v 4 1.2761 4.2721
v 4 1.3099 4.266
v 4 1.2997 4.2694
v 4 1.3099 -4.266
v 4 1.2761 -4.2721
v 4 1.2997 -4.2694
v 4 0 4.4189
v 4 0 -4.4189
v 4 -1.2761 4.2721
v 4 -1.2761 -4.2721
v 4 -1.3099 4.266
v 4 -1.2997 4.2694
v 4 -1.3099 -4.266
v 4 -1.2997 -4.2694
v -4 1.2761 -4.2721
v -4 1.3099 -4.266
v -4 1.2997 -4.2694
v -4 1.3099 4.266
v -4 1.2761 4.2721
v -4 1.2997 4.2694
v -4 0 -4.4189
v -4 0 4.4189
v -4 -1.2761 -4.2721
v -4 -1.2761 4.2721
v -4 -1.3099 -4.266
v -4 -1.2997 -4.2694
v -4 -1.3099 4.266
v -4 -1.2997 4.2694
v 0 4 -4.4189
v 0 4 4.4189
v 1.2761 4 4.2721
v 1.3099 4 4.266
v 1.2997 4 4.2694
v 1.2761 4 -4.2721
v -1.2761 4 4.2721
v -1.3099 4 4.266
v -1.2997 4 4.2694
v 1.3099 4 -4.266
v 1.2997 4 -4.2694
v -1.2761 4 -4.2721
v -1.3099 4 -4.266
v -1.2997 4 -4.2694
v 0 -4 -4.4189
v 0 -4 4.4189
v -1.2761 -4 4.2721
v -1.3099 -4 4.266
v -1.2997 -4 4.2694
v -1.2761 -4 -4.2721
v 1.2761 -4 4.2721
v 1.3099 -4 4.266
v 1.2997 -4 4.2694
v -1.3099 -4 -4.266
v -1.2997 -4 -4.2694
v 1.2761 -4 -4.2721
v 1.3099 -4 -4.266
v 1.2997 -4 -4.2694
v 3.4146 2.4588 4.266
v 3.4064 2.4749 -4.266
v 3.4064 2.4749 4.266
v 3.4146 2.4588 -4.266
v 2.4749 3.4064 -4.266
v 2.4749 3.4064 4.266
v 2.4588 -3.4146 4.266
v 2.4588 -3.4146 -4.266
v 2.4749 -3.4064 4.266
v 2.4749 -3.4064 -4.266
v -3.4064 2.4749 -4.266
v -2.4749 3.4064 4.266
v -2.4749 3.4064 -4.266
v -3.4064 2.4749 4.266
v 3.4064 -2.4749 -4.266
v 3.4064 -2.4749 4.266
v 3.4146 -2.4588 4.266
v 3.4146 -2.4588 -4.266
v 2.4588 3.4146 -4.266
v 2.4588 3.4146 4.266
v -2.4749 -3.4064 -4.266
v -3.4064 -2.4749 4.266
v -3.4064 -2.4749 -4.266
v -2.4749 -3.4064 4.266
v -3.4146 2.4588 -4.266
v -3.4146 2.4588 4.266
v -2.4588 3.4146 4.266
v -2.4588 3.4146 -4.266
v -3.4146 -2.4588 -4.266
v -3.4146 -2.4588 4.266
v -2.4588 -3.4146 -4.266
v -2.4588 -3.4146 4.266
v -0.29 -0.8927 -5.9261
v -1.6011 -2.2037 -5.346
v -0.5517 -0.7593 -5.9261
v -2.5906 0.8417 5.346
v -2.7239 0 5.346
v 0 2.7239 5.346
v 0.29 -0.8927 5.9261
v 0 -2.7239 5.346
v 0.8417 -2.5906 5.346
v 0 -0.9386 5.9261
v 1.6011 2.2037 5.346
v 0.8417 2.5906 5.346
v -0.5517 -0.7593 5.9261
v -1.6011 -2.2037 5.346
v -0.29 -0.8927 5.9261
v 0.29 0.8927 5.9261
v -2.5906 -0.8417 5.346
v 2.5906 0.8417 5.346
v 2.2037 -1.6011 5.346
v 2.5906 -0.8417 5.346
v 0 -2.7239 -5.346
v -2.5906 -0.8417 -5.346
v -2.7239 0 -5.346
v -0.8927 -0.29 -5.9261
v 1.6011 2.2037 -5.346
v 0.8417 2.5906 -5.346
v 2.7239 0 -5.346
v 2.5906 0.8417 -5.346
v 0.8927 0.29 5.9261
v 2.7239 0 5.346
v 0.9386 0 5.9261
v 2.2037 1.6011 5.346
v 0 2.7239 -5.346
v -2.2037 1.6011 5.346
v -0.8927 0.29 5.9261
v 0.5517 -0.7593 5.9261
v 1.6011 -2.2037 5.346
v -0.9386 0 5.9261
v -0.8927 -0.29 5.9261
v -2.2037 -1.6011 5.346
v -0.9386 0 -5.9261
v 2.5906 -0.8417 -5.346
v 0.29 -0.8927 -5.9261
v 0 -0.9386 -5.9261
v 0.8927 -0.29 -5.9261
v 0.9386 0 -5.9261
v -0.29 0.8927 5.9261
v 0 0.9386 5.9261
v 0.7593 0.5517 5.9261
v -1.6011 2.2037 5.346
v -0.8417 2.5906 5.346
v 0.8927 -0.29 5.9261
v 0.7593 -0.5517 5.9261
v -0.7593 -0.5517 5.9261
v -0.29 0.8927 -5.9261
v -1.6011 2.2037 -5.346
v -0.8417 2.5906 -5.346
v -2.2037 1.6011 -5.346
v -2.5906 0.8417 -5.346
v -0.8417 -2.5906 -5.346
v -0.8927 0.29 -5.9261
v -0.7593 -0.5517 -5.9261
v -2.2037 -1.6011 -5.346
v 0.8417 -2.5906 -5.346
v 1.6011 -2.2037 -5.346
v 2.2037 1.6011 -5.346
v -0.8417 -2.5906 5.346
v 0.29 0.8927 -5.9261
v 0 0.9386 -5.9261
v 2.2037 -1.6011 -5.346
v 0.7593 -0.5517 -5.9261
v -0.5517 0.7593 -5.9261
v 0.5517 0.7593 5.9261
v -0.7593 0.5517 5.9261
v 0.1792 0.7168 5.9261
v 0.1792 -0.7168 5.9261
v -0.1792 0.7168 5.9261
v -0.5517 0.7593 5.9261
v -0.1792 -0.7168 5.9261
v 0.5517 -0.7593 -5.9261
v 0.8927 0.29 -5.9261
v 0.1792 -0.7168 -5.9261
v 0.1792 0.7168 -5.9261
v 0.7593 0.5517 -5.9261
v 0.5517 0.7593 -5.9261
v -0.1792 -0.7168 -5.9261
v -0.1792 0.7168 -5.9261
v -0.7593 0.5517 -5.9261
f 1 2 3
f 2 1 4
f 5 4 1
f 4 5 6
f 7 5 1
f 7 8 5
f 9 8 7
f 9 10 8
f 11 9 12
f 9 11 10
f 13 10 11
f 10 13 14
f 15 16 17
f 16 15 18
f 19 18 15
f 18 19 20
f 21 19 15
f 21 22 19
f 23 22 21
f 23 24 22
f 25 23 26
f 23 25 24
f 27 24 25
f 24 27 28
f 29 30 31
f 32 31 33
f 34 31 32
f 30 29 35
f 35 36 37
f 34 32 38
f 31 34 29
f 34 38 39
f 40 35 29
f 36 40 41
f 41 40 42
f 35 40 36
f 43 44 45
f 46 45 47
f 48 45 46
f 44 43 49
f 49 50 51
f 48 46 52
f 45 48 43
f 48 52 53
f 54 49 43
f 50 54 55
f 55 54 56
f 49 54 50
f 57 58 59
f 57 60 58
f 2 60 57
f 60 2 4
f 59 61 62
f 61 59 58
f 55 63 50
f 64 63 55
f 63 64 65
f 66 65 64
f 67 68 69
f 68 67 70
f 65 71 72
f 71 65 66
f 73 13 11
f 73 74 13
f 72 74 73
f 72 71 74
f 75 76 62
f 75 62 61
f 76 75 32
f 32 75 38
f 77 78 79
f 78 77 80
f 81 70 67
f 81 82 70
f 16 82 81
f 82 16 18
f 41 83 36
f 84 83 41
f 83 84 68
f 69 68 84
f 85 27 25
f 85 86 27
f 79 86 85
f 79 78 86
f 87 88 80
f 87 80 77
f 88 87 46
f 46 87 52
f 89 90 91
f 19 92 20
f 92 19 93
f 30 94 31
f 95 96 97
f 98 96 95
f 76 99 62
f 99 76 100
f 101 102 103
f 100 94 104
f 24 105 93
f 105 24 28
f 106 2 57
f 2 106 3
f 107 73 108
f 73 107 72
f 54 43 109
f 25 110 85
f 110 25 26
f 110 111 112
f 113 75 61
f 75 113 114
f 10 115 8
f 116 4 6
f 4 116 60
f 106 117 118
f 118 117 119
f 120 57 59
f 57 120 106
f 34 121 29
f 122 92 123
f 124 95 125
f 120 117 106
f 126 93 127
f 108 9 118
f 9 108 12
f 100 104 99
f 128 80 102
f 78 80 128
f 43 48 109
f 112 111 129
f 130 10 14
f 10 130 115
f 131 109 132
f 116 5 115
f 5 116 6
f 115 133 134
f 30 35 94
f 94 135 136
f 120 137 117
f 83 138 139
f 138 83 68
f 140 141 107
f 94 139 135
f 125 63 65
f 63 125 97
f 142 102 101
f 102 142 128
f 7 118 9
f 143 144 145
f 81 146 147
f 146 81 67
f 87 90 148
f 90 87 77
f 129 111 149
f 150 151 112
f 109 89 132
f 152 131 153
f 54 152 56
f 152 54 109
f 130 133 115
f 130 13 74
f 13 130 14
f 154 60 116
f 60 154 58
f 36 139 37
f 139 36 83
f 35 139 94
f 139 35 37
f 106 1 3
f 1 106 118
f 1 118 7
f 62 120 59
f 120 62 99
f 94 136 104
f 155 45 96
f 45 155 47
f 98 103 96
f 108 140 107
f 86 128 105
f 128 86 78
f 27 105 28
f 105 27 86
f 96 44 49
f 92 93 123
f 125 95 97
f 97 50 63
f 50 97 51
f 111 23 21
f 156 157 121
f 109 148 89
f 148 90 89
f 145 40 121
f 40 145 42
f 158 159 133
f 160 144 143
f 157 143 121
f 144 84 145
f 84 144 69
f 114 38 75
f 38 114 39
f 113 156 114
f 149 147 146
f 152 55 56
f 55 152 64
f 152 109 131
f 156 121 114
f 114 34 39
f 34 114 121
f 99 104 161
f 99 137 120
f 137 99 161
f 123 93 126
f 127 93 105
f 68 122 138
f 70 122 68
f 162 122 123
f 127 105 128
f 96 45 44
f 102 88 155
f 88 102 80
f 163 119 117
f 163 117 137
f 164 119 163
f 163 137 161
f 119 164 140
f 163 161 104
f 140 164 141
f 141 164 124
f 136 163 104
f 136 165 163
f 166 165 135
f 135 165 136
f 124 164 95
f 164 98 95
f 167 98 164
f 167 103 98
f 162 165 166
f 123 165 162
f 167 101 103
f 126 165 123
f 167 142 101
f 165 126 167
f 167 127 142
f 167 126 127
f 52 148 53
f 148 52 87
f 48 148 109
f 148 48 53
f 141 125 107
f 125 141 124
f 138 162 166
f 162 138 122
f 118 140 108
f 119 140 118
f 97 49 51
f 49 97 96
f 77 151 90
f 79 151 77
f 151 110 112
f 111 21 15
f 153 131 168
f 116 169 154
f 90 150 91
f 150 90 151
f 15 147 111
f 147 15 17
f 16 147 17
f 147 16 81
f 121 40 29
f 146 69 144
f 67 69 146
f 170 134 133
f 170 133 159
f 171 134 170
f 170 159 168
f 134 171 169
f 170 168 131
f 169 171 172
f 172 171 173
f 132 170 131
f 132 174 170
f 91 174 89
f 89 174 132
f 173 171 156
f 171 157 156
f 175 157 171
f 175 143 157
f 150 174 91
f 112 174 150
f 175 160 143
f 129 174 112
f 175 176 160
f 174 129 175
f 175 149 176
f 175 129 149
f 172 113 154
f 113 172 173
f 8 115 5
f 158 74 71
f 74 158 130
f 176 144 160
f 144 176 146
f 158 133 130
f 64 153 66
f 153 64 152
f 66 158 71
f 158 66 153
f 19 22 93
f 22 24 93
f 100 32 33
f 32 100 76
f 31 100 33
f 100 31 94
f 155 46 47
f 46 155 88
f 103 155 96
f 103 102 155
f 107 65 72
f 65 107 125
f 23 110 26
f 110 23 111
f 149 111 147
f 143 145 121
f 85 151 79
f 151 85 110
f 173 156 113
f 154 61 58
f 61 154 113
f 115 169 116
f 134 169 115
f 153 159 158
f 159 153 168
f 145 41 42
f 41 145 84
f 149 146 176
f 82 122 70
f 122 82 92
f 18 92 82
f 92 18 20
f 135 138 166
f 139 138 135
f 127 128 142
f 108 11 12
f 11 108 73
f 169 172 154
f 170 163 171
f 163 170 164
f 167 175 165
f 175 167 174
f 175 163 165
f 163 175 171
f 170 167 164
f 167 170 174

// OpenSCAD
/*********************************************************************/
/* Parametric Fused Clapton helper tool for wire building.           */
/* Desgined by: mastabug                                             */
/* Version: 1                                                        */
/* Released: 2018-02-08                                              */
/*********************************************************************/

/*********************************************************************/
/* Parameters that you can adjust to accomodate your specific needs. */
/*********************************************************************/
width = 8;
length = 12;
wireCrossSectionMM=0.32; /*NB! In mm!!! Know your wires 26AWG=0.4mm, 28AWG=0.32, etc.*/
wiresToFit=4;
gapTolerance=1.12; /*Multiplier, how much bigger to make the hole compared to wire. */

/*********************************************************************/
/* Don't change below this unless you really know what you're doing! */
/*********************************************************************/
$fn=20;

difference() {
	intersection() {
		cube([width, width, length], center = true);
		cylinder(r= width/1.9, h = length, center = true);
		sphere(r = length/2);
	}
	cube([wireCrossSectionMM*gapTolerance, wireCrossSectionMM * wiresToFit*gapTolerance, length], center = true);
}
